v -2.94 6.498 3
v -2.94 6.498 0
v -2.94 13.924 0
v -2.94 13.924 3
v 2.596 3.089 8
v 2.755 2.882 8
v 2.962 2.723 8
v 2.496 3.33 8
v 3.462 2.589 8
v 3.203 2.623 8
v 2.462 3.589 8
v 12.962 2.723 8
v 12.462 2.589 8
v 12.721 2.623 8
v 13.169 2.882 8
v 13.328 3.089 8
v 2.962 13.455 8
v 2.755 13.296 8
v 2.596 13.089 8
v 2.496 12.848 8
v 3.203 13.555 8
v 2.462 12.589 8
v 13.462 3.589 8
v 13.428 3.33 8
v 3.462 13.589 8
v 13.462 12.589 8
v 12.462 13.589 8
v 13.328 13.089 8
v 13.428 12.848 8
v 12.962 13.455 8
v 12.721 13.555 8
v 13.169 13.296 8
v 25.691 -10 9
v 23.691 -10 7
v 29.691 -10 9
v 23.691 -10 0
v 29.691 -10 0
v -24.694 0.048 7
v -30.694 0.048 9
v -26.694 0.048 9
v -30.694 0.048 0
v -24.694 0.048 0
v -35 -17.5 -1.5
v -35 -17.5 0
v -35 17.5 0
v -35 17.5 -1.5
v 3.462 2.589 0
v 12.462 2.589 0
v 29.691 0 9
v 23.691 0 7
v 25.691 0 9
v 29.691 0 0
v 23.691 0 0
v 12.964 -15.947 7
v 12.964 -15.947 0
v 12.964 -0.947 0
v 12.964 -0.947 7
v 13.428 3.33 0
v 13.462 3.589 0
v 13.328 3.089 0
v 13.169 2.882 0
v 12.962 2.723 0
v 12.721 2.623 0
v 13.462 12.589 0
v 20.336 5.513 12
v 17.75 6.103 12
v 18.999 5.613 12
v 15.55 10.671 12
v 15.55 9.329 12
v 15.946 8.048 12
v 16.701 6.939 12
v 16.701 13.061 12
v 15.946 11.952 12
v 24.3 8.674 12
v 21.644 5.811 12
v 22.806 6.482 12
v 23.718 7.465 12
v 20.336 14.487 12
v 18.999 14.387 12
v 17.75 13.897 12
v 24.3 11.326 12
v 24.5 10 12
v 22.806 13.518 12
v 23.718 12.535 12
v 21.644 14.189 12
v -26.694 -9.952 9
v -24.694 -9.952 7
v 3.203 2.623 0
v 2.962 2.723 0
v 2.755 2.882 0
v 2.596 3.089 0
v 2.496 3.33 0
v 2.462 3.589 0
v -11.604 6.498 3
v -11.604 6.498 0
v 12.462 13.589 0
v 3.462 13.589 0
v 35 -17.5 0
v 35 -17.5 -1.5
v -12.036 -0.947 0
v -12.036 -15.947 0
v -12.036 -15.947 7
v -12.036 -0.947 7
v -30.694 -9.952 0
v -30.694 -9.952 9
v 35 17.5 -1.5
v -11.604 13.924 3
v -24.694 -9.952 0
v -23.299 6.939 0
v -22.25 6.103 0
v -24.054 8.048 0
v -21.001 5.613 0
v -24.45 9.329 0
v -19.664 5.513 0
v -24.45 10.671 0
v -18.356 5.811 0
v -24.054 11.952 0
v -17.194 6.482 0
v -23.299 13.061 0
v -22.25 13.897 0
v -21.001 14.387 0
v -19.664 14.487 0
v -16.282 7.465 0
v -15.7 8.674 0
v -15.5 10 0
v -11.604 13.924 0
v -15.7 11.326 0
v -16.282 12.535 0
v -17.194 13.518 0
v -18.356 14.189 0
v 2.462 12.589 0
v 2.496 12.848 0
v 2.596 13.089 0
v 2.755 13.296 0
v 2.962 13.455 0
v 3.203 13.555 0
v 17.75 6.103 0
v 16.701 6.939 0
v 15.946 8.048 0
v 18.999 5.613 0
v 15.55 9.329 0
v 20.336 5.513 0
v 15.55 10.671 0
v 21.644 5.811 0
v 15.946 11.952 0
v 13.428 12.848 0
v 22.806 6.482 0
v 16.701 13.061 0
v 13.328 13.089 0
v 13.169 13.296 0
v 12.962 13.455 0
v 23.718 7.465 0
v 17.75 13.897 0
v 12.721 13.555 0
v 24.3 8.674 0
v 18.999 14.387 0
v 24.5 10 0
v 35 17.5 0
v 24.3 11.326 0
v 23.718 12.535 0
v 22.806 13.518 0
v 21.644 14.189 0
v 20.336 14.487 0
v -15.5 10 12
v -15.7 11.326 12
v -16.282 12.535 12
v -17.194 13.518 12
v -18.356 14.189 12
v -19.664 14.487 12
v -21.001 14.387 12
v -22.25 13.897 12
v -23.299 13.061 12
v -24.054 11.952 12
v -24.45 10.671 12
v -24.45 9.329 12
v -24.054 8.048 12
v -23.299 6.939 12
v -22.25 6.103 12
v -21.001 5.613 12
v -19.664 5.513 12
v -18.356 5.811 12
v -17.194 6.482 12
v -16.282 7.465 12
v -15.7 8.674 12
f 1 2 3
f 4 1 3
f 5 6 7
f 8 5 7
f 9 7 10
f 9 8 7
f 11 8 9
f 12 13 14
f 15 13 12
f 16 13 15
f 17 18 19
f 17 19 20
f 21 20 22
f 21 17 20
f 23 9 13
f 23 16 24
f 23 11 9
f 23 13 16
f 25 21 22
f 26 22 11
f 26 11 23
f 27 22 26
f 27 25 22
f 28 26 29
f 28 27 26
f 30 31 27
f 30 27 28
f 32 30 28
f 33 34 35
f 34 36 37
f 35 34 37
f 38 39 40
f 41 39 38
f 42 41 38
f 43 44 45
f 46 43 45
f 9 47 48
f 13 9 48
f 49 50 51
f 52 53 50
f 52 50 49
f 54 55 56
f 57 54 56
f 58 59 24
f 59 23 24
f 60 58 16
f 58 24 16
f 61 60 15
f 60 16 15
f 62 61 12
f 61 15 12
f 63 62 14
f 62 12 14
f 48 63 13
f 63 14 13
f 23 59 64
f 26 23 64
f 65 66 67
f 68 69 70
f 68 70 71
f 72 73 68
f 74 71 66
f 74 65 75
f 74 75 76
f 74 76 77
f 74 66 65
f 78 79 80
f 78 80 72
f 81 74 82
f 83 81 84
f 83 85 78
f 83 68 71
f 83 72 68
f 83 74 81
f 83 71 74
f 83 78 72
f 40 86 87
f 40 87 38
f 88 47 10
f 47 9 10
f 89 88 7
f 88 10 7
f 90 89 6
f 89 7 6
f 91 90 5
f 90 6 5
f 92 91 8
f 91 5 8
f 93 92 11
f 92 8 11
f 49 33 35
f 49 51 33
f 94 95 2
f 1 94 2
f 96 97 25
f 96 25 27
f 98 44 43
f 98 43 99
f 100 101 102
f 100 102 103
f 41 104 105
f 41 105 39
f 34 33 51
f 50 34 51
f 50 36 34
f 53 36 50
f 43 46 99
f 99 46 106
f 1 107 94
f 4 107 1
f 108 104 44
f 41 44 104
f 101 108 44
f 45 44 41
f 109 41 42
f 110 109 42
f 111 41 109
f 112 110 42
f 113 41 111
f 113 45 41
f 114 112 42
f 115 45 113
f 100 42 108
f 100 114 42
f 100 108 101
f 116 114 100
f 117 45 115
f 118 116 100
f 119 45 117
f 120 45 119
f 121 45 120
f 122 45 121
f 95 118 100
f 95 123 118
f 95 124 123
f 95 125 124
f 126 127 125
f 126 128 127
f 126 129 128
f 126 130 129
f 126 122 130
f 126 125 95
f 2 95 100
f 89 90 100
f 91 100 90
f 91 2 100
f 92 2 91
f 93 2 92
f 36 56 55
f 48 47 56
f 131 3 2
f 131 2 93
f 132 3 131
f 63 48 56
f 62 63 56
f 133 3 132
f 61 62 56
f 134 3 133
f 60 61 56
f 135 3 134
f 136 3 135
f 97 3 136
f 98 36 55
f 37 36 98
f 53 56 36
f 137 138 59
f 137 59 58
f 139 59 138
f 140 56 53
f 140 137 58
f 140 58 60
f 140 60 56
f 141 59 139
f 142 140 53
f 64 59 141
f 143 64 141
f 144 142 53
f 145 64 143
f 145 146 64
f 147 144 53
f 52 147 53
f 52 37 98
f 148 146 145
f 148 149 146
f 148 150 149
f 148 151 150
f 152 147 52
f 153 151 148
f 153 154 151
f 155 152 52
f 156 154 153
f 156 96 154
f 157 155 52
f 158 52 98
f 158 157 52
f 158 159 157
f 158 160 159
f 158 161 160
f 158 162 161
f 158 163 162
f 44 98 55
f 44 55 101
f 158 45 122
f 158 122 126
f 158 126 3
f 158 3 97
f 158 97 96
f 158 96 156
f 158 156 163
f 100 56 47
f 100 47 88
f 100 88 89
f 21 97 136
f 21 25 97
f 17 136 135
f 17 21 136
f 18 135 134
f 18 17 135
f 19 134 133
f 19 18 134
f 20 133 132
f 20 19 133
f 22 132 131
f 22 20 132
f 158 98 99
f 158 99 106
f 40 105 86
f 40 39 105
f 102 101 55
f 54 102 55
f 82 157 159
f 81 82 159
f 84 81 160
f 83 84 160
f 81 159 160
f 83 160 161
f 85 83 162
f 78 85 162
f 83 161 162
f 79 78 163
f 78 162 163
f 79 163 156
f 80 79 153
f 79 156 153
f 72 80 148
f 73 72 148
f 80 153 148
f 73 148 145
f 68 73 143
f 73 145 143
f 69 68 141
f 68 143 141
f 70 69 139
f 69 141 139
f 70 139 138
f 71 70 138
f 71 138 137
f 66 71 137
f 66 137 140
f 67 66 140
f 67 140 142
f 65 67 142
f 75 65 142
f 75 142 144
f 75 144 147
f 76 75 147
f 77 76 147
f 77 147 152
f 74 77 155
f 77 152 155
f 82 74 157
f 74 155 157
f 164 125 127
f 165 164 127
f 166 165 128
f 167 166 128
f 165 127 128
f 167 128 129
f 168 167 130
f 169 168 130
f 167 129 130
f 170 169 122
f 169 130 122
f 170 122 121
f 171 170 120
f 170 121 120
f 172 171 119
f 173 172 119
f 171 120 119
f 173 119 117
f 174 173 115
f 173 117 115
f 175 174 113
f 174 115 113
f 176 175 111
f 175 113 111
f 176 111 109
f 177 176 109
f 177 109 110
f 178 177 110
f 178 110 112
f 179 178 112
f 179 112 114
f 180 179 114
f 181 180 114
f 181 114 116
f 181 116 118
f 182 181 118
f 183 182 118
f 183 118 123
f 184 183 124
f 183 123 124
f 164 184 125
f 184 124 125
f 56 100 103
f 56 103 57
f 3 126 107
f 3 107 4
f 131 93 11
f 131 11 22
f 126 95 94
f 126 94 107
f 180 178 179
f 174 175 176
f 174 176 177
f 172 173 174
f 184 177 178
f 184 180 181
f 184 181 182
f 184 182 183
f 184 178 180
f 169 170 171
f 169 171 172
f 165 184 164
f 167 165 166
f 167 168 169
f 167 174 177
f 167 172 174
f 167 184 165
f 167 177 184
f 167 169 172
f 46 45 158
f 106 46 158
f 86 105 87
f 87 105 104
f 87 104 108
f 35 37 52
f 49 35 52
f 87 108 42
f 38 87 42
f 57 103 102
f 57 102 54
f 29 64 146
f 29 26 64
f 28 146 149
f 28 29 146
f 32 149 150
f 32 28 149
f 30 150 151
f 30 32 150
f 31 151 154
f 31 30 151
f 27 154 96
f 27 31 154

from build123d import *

# Parameters (mm, degrees)
F0_W      = 70
F0_H      = 35
F1_DEPTH  = 1.5
F2_R      = 4.5
F3_DEPTH  = 12
F4_W      = 8.664048
F4_H      = 7.426328
F5_DEPTH  = 3
F6_W      = 11
F6_H      = 11
F7_DEPTH  = 8
F8_R      = 1
F9_R      = 1
F10_W     = 25
F10_H     = 15
F11_DEPTH = 7
F12_W     = 6
F12_H     = 10
F13_DEPTH = 9
F14_SIZE  = 2
F15_SIZE  = 2


with BuildPart() as f1:
    # F0 (on Top) → F1 (new body)
    with BuildSketch(Plane.XY):
        Rectangle(F0_W, F0_H)
    extrude(amount=-F1_DEPTH)

    # F2 (on Top) → F3 (join)
    with BuildSketch(Plane.XY):
        with Locations((-20, 10)):
            Circle(F2_R)
        with Locations((20, 10)):
            Circle(F2_R)
    extrude(amount=F3_DEPTH)

    # F4 (on Top) → F5 (join)
    with BuildSketch(Plane.XY):
        with Locations((-7.271611, 10.2112)):
            Rectangle(F4_W, F4_H)
    extrude(amount=F5_DEPTH)

    # F6 (on Top) → F7 (join)
    with BuildSketch(Plane.XY):
        with Locations((7.962182, 8.088716)):
            Rectangle(F6_W, F6_H)
    extrude(amount=F7_DEPTH)

    # F8
    f8_edges = [f1.edges().sort_by_distance(p)[0] for p in [
        (13.462182, 13.588716, 4),
    ]]
    fillet(f8_edges, radius=F8_R)

    # F9
    f9_edges = [f1.edges().sort_by_distance(p)[0] for p in [
        (2.462182, 2.588716, 4),
        (13.462182, 2.588716, 4),
        (2.462182, 13.588716, 4),
    ]]
    fillet(f9_edges, radius=F9_R)

    # F10 (on Top) → F11 (join)
    with BuildSketch(Plane.XY):
        with Locations((0.464146, -8.447183)):
            Rectangle(F10_W, F10_H)
    extrude(amount=F11_DEPTH)

    # F12 (on Top) → F13 (join)
    with BuildSketch(Plane.XY):
        with Locations((26.690762, -5)):
            Rectangle(F12_W, F12_H)
        with Locations((-27.694009, -4.952371)):
            Rectangle(F12_W, F12_H)
    extrude(amount=F13_DEPTH)

    # F14
    f14_edges = [f1.edges().sort_by_distance(p)[0] for p in [
        (-24.694009, -4.952371, 9),
    ]]
    chamfer(f14_edges, length=F14_SIZE)

    # F15
    f15_edges = [f1.edges().sort_by_distance(p)[0] for p in [
        (23.690762, -5, 9),
    ]]
    chamfer(f15_edges, length=F15_SIZE)


solid = f1.part
